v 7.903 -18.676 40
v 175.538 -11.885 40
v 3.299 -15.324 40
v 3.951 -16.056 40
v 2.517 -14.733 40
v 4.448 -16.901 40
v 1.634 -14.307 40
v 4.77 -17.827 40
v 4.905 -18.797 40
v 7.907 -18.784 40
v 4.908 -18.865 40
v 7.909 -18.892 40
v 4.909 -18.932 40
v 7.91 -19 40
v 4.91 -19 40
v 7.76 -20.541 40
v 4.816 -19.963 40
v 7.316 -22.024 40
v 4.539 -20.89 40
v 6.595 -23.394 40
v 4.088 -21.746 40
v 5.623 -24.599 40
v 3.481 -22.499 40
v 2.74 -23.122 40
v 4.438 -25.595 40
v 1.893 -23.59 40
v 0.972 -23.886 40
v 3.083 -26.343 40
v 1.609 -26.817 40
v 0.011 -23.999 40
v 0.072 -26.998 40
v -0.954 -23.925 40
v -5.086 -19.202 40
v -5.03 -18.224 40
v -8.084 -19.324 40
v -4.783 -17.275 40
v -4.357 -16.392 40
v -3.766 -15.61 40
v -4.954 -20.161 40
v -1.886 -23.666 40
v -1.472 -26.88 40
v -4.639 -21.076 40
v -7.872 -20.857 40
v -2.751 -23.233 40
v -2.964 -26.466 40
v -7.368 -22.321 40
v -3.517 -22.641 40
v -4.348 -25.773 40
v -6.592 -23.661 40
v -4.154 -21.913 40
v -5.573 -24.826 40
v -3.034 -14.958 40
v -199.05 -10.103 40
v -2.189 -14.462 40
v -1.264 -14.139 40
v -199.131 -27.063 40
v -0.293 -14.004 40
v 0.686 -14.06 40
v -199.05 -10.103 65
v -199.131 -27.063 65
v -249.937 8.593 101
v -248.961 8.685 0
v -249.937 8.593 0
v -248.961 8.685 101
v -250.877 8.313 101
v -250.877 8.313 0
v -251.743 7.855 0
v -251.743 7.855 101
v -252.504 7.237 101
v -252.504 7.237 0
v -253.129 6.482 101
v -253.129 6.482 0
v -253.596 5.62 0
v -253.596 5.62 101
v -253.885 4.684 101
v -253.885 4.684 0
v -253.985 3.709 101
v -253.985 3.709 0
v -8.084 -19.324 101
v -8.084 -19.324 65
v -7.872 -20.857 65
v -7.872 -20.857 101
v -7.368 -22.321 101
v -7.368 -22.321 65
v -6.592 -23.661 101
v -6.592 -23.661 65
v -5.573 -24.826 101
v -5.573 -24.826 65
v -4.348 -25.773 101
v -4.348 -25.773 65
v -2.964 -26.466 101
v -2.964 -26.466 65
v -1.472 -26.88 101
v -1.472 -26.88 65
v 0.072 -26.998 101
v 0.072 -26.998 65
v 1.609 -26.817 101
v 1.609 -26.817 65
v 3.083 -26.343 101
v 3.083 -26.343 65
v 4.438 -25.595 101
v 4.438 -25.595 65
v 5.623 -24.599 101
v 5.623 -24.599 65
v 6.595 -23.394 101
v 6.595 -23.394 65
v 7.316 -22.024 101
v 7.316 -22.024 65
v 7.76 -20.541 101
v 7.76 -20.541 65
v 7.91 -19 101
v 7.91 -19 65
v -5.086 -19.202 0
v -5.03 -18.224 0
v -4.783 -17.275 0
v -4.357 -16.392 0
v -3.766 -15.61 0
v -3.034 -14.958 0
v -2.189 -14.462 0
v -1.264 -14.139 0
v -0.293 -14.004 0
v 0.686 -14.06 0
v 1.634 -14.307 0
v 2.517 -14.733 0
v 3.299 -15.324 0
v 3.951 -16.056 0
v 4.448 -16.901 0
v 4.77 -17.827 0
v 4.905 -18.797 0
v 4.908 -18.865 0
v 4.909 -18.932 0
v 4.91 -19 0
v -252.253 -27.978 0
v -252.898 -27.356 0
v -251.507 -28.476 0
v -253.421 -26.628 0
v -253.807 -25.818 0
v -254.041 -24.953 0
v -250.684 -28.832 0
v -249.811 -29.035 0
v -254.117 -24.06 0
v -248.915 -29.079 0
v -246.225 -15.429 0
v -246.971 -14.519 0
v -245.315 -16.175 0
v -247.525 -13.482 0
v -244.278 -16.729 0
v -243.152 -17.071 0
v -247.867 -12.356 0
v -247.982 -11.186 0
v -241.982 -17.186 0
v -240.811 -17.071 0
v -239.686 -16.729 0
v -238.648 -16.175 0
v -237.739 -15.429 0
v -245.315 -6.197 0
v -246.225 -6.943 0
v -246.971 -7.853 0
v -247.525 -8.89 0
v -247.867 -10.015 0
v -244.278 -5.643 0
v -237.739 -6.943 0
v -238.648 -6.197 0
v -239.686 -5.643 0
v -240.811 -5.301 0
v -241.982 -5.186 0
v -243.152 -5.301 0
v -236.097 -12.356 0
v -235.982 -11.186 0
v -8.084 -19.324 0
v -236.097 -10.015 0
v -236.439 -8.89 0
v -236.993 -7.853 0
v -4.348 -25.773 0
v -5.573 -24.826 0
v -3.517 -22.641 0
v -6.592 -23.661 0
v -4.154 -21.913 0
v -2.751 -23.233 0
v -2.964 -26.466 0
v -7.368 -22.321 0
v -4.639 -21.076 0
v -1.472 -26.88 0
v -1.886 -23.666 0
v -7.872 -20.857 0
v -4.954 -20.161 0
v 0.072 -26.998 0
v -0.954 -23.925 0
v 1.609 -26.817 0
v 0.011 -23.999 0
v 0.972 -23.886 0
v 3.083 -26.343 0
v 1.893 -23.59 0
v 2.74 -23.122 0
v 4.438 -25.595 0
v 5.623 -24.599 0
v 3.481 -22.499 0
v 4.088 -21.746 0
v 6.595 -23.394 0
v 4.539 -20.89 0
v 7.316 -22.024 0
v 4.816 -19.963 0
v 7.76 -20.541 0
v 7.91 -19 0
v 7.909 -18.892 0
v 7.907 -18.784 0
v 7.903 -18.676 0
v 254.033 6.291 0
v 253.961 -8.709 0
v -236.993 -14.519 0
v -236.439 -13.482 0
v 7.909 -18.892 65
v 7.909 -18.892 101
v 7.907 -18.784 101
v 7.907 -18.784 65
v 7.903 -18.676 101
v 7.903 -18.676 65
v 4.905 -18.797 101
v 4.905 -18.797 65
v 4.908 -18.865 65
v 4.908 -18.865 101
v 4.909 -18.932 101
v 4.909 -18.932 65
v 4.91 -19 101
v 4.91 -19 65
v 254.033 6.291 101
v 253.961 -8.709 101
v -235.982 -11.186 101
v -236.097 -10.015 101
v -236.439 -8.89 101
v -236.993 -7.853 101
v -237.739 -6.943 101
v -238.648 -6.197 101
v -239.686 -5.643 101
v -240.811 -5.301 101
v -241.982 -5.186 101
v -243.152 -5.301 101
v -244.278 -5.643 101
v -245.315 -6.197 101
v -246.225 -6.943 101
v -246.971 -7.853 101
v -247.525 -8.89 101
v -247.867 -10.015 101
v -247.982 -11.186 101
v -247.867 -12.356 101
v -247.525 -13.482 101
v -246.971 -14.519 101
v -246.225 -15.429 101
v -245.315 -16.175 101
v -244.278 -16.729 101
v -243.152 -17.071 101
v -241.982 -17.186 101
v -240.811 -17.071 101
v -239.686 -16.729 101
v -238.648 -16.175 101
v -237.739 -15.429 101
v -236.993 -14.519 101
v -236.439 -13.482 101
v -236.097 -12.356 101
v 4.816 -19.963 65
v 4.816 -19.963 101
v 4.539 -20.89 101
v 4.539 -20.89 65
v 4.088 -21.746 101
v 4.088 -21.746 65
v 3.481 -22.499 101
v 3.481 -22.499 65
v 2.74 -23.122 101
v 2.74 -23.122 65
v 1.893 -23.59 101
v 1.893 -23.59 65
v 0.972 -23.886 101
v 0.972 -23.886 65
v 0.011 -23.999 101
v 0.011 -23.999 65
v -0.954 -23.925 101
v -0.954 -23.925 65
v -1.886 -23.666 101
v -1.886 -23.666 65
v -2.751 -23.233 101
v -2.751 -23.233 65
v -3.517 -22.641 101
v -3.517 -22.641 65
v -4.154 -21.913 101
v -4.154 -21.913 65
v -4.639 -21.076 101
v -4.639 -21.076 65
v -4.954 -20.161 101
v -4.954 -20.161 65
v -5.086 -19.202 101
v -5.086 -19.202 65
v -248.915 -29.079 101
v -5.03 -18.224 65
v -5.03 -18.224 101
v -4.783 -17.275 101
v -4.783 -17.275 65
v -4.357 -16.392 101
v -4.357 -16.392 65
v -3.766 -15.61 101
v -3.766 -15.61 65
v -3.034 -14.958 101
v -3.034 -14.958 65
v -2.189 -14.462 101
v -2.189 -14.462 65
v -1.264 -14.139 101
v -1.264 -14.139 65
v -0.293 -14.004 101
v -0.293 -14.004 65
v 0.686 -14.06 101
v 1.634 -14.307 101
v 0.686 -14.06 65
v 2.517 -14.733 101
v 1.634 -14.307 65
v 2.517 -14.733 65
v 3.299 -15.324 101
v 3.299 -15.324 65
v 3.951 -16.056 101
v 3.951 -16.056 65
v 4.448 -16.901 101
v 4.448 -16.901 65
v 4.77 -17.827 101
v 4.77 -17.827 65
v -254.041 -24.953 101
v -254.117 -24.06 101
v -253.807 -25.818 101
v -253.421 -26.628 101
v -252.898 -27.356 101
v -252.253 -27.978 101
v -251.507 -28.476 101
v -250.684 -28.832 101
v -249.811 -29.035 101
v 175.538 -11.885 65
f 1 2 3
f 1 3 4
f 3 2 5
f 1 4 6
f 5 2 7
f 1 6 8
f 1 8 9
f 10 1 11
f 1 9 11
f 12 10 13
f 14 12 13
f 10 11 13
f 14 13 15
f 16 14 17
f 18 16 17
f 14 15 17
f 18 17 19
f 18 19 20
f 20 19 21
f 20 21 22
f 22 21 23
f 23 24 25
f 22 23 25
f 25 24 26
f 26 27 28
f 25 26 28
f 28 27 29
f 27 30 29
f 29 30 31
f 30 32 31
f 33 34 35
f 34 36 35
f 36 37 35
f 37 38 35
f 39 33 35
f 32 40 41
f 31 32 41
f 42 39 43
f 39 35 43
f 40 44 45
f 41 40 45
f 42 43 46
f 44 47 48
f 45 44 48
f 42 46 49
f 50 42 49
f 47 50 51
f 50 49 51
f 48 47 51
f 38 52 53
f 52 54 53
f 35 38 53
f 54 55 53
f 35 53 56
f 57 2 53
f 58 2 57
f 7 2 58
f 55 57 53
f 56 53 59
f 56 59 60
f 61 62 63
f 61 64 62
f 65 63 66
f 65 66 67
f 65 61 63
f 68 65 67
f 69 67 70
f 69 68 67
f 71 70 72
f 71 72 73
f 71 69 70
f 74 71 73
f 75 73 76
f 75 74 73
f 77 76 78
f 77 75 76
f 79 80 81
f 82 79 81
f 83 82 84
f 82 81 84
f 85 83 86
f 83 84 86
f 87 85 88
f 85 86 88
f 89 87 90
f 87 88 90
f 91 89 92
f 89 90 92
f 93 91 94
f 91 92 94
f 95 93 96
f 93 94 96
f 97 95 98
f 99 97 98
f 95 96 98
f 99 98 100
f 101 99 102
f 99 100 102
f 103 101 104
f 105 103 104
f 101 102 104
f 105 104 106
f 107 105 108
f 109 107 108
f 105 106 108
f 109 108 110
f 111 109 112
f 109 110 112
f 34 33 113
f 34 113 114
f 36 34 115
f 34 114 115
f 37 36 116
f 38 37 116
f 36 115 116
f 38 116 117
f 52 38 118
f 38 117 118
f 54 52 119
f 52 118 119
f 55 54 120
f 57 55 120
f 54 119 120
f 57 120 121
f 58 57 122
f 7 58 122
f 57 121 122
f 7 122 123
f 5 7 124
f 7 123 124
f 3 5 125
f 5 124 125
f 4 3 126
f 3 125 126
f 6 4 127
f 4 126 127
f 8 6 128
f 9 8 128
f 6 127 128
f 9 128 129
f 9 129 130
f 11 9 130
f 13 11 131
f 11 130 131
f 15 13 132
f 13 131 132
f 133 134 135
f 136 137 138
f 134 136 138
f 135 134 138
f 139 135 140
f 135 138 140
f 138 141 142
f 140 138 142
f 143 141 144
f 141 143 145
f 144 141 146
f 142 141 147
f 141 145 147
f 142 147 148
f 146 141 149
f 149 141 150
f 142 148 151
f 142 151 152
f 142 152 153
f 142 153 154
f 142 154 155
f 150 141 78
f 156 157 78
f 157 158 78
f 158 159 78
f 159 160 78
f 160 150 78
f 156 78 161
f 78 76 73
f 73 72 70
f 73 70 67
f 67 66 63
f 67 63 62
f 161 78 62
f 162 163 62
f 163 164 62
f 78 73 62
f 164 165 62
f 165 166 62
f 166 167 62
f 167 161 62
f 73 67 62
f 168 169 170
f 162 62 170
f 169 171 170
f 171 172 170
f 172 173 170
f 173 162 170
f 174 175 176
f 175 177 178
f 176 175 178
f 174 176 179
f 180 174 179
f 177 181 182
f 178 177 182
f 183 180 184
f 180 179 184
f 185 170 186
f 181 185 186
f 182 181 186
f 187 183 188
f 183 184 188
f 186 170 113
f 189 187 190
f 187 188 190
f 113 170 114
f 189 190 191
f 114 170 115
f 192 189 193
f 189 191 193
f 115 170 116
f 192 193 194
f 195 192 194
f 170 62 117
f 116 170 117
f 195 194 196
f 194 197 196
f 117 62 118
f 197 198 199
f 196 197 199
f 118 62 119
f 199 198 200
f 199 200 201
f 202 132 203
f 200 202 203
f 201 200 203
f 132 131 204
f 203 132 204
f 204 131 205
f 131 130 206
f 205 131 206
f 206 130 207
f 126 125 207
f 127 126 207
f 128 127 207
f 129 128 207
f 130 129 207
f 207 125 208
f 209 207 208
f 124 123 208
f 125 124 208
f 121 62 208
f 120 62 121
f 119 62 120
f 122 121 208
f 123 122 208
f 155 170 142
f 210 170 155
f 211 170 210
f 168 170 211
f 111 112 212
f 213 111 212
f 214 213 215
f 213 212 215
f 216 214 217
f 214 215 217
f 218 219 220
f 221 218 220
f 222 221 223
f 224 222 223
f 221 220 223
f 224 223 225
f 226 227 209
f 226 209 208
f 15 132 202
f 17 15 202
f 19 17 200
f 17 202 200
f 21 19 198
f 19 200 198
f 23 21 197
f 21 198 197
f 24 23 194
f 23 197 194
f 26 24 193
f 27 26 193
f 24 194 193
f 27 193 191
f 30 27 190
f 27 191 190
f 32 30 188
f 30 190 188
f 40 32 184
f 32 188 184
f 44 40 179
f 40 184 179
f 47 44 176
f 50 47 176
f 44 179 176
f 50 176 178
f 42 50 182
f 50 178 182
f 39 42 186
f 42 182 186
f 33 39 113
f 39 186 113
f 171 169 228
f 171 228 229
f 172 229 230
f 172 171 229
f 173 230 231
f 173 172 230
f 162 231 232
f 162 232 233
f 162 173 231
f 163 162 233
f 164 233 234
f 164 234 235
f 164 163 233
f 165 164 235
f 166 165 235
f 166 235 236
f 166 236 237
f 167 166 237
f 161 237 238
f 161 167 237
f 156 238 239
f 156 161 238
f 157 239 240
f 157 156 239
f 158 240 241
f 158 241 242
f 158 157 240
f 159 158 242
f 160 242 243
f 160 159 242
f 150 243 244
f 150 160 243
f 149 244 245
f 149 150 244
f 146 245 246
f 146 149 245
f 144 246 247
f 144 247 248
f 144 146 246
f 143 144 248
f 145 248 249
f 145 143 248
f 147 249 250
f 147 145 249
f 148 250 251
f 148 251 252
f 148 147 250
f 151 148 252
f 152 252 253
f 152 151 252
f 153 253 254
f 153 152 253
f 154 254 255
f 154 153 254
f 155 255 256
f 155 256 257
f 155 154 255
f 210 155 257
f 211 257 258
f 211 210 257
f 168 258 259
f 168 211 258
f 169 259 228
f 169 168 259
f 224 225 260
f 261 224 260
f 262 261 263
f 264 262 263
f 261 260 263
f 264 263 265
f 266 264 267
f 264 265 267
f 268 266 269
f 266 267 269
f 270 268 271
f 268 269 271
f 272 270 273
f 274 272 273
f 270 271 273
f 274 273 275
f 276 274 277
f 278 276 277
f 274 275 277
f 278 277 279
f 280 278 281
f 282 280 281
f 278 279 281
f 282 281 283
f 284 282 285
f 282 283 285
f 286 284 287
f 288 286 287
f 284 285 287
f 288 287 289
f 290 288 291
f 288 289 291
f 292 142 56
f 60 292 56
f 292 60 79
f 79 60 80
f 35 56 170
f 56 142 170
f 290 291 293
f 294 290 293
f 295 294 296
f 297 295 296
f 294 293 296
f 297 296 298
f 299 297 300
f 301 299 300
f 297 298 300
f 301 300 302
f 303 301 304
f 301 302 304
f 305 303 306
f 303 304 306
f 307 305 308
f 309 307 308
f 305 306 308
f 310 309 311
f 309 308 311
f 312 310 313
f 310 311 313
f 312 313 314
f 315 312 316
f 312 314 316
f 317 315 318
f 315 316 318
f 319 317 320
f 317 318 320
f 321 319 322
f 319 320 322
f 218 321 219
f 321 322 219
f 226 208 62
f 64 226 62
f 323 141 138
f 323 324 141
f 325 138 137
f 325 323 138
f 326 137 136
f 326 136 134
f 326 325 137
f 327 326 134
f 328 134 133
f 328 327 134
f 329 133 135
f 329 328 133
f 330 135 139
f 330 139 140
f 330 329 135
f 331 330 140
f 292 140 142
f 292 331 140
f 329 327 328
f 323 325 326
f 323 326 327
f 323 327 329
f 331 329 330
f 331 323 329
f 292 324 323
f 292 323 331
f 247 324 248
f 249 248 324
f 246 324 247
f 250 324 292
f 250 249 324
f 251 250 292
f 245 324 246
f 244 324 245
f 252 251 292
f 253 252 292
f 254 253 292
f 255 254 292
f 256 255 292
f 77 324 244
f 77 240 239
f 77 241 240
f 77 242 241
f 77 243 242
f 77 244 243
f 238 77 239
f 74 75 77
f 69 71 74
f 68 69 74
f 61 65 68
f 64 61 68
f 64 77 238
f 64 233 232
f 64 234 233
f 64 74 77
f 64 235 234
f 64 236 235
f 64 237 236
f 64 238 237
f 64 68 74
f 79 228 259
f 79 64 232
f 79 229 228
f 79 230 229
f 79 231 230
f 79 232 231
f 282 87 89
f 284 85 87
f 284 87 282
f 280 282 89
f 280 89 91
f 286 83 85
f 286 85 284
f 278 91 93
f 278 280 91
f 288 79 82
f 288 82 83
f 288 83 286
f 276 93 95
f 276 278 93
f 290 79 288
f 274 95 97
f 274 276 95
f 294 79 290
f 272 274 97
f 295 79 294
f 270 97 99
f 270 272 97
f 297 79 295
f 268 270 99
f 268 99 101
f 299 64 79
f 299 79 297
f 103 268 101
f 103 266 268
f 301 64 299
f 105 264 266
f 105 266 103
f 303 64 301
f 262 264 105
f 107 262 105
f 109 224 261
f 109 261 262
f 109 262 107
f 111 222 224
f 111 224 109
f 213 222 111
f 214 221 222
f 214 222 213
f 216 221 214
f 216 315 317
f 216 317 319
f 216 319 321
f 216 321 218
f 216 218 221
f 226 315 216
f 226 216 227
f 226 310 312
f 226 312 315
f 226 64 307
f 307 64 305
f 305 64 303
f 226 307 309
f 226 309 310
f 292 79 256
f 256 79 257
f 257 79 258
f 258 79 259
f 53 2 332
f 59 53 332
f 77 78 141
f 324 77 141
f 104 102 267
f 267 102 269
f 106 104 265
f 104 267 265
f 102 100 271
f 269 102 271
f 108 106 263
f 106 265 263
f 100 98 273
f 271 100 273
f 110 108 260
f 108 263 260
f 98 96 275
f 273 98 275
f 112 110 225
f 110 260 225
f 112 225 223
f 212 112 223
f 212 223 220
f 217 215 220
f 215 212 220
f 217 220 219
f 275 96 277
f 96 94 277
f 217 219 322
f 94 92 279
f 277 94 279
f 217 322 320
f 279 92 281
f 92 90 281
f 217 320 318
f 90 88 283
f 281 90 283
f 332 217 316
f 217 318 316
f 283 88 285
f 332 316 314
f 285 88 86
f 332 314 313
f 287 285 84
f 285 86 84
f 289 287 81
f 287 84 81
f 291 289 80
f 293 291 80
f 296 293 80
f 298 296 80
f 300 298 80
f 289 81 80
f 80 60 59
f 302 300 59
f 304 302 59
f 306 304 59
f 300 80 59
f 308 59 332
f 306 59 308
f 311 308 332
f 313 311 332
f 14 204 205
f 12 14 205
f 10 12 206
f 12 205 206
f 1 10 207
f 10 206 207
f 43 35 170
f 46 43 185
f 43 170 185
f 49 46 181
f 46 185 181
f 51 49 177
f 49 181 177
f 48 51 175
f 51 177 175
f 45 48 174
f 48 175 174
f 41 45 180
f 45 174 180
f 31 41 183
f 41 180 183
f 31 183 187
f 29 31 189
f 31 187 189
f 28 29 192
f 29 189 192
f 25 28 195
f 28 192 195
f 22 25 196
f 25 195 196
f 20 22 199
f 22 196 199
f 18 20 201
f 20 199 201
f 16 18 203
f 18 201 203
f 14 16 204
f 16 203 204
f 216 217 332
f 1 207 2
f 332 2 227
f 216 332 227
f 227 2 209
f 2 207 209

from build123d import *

# Parameters (mm, degrees)
F0_R     = 6
F1_DEPTH = 101
F2_R     = 5
F4_START = -55
F3_W     = 4.994883243
F3_H     = 25
F3_W_2   = 5.9151866052
F3_W_3   = 8.303230216
F4_DEPTH = 453


# Not quite as in the source:
# - a feature names something its author has since deleted; it is built from what else it names


with BuildPart() as f1:
    # F0 (on Top) → F1 (new body)
    with BuildSketch(Plane.XY):
        with BuildLine():
            Line((254.0328107559, 6.2914491919), (-253.9614388373, 8.7085508081))
            Line((-253.9614388373, 8.7085508081), (-254.1422456511, -29.2910190433))
            Line((-254.1422456511, -29.2910190433), (-8.0838477514, -19.3235865814))
            ThreePointArc((-8.0838477514, -19.3235865814), (-0.4142050626, -11.0063405813), (7.9030409375, -18.67598327))
            Line((7.9030409375, -18.67598327), (253.9614388373, -8.7085508081))
            Line((253.9614388373, -8.7085508081), (254.0328107559, 6.2914491919))
        make_face()
        with Locations((-241.9818616233, -11.1859360032)):
            Circle(F0_R, mode=Mode.SUBTRACT)
        with BuildLine():
            ThreePointArc((7.9030409375, -18.67598327), (-0.4142050626, -11.0063405813), (-8.0838477514, -19.3235865814))
            Line((-8.0838477514, -19.3235865814), (-5.0863061222, -19.2021609605))
            ThreePointArc((-5.0863061222, -19.2021609605), (-0.2927794417, -14.0038822105), (4.9054993084, -18.7974088909))
            Line((4.9054993084, -18.7974088909), (7.9030409375, -18.67598327))
        make_face()
        with BuildLine():
            Line((-5.0863061222, -19.2021609605), (-8.0838477514, -19.3235865814))
            ThreePointArc((-8.0838477514, -19.3235865814), (0.0715305988, -26.9981458439), (7.9095965931, -18.9997849257))
            ThreePointArc((7.9095965931, -18.9997849257), (7.9079575113, -18.83785092), (7.9030409375, -18.67598327))
            Line((7.9030409375, -18.67598327), (4.9054993084, -18.7974088909))
            ThreePointArc((4.9054993084, -18.7974088909), (4.908572167, -18.8985761721), (4.9095965931, -18.9997849257))
            ThreePointArc((4.9095965931, -18.9997849257), (0.0108053467, -23.9987604996), (-5.0863061222, -19.2021609605))
        make_face()
    extrude(amount=F1_DEPTH)

    # F2
    f2_edges = [f1.edges().sort_by_distance(p)[0] for p in [
        (-254.142246, -29.291019, 50.5),
        (-253.961439, 8.708551, 50.5),
    ]]
    fillet(f2_edges, radius=F2_R)

    # F3 (on face) → F4 (cut)
    with BuildSketch(Plane(origin=(-253.9971247966, 1.2085508081, 0), x_dir=(-0.004758074, -0.9999886803, 0), z_dir=(-0.9999886803, 0.004758074, 0)).offset(F4_START)):
        with Locations((27.7658584427, 52.5)):
            Rectangle(F3_W, F3_H)
        with Locations((22.3108235186, 52.5)):
            Rectangle(F3_W_2, F3_H)
        with Locations((15.201615108, 52.5)):
            Rectangle(F3_W_3, F3_H)
    extrude(amount=-F4_DEPTH, mode=Mode.SUBTRACT)


solid = f1.part
